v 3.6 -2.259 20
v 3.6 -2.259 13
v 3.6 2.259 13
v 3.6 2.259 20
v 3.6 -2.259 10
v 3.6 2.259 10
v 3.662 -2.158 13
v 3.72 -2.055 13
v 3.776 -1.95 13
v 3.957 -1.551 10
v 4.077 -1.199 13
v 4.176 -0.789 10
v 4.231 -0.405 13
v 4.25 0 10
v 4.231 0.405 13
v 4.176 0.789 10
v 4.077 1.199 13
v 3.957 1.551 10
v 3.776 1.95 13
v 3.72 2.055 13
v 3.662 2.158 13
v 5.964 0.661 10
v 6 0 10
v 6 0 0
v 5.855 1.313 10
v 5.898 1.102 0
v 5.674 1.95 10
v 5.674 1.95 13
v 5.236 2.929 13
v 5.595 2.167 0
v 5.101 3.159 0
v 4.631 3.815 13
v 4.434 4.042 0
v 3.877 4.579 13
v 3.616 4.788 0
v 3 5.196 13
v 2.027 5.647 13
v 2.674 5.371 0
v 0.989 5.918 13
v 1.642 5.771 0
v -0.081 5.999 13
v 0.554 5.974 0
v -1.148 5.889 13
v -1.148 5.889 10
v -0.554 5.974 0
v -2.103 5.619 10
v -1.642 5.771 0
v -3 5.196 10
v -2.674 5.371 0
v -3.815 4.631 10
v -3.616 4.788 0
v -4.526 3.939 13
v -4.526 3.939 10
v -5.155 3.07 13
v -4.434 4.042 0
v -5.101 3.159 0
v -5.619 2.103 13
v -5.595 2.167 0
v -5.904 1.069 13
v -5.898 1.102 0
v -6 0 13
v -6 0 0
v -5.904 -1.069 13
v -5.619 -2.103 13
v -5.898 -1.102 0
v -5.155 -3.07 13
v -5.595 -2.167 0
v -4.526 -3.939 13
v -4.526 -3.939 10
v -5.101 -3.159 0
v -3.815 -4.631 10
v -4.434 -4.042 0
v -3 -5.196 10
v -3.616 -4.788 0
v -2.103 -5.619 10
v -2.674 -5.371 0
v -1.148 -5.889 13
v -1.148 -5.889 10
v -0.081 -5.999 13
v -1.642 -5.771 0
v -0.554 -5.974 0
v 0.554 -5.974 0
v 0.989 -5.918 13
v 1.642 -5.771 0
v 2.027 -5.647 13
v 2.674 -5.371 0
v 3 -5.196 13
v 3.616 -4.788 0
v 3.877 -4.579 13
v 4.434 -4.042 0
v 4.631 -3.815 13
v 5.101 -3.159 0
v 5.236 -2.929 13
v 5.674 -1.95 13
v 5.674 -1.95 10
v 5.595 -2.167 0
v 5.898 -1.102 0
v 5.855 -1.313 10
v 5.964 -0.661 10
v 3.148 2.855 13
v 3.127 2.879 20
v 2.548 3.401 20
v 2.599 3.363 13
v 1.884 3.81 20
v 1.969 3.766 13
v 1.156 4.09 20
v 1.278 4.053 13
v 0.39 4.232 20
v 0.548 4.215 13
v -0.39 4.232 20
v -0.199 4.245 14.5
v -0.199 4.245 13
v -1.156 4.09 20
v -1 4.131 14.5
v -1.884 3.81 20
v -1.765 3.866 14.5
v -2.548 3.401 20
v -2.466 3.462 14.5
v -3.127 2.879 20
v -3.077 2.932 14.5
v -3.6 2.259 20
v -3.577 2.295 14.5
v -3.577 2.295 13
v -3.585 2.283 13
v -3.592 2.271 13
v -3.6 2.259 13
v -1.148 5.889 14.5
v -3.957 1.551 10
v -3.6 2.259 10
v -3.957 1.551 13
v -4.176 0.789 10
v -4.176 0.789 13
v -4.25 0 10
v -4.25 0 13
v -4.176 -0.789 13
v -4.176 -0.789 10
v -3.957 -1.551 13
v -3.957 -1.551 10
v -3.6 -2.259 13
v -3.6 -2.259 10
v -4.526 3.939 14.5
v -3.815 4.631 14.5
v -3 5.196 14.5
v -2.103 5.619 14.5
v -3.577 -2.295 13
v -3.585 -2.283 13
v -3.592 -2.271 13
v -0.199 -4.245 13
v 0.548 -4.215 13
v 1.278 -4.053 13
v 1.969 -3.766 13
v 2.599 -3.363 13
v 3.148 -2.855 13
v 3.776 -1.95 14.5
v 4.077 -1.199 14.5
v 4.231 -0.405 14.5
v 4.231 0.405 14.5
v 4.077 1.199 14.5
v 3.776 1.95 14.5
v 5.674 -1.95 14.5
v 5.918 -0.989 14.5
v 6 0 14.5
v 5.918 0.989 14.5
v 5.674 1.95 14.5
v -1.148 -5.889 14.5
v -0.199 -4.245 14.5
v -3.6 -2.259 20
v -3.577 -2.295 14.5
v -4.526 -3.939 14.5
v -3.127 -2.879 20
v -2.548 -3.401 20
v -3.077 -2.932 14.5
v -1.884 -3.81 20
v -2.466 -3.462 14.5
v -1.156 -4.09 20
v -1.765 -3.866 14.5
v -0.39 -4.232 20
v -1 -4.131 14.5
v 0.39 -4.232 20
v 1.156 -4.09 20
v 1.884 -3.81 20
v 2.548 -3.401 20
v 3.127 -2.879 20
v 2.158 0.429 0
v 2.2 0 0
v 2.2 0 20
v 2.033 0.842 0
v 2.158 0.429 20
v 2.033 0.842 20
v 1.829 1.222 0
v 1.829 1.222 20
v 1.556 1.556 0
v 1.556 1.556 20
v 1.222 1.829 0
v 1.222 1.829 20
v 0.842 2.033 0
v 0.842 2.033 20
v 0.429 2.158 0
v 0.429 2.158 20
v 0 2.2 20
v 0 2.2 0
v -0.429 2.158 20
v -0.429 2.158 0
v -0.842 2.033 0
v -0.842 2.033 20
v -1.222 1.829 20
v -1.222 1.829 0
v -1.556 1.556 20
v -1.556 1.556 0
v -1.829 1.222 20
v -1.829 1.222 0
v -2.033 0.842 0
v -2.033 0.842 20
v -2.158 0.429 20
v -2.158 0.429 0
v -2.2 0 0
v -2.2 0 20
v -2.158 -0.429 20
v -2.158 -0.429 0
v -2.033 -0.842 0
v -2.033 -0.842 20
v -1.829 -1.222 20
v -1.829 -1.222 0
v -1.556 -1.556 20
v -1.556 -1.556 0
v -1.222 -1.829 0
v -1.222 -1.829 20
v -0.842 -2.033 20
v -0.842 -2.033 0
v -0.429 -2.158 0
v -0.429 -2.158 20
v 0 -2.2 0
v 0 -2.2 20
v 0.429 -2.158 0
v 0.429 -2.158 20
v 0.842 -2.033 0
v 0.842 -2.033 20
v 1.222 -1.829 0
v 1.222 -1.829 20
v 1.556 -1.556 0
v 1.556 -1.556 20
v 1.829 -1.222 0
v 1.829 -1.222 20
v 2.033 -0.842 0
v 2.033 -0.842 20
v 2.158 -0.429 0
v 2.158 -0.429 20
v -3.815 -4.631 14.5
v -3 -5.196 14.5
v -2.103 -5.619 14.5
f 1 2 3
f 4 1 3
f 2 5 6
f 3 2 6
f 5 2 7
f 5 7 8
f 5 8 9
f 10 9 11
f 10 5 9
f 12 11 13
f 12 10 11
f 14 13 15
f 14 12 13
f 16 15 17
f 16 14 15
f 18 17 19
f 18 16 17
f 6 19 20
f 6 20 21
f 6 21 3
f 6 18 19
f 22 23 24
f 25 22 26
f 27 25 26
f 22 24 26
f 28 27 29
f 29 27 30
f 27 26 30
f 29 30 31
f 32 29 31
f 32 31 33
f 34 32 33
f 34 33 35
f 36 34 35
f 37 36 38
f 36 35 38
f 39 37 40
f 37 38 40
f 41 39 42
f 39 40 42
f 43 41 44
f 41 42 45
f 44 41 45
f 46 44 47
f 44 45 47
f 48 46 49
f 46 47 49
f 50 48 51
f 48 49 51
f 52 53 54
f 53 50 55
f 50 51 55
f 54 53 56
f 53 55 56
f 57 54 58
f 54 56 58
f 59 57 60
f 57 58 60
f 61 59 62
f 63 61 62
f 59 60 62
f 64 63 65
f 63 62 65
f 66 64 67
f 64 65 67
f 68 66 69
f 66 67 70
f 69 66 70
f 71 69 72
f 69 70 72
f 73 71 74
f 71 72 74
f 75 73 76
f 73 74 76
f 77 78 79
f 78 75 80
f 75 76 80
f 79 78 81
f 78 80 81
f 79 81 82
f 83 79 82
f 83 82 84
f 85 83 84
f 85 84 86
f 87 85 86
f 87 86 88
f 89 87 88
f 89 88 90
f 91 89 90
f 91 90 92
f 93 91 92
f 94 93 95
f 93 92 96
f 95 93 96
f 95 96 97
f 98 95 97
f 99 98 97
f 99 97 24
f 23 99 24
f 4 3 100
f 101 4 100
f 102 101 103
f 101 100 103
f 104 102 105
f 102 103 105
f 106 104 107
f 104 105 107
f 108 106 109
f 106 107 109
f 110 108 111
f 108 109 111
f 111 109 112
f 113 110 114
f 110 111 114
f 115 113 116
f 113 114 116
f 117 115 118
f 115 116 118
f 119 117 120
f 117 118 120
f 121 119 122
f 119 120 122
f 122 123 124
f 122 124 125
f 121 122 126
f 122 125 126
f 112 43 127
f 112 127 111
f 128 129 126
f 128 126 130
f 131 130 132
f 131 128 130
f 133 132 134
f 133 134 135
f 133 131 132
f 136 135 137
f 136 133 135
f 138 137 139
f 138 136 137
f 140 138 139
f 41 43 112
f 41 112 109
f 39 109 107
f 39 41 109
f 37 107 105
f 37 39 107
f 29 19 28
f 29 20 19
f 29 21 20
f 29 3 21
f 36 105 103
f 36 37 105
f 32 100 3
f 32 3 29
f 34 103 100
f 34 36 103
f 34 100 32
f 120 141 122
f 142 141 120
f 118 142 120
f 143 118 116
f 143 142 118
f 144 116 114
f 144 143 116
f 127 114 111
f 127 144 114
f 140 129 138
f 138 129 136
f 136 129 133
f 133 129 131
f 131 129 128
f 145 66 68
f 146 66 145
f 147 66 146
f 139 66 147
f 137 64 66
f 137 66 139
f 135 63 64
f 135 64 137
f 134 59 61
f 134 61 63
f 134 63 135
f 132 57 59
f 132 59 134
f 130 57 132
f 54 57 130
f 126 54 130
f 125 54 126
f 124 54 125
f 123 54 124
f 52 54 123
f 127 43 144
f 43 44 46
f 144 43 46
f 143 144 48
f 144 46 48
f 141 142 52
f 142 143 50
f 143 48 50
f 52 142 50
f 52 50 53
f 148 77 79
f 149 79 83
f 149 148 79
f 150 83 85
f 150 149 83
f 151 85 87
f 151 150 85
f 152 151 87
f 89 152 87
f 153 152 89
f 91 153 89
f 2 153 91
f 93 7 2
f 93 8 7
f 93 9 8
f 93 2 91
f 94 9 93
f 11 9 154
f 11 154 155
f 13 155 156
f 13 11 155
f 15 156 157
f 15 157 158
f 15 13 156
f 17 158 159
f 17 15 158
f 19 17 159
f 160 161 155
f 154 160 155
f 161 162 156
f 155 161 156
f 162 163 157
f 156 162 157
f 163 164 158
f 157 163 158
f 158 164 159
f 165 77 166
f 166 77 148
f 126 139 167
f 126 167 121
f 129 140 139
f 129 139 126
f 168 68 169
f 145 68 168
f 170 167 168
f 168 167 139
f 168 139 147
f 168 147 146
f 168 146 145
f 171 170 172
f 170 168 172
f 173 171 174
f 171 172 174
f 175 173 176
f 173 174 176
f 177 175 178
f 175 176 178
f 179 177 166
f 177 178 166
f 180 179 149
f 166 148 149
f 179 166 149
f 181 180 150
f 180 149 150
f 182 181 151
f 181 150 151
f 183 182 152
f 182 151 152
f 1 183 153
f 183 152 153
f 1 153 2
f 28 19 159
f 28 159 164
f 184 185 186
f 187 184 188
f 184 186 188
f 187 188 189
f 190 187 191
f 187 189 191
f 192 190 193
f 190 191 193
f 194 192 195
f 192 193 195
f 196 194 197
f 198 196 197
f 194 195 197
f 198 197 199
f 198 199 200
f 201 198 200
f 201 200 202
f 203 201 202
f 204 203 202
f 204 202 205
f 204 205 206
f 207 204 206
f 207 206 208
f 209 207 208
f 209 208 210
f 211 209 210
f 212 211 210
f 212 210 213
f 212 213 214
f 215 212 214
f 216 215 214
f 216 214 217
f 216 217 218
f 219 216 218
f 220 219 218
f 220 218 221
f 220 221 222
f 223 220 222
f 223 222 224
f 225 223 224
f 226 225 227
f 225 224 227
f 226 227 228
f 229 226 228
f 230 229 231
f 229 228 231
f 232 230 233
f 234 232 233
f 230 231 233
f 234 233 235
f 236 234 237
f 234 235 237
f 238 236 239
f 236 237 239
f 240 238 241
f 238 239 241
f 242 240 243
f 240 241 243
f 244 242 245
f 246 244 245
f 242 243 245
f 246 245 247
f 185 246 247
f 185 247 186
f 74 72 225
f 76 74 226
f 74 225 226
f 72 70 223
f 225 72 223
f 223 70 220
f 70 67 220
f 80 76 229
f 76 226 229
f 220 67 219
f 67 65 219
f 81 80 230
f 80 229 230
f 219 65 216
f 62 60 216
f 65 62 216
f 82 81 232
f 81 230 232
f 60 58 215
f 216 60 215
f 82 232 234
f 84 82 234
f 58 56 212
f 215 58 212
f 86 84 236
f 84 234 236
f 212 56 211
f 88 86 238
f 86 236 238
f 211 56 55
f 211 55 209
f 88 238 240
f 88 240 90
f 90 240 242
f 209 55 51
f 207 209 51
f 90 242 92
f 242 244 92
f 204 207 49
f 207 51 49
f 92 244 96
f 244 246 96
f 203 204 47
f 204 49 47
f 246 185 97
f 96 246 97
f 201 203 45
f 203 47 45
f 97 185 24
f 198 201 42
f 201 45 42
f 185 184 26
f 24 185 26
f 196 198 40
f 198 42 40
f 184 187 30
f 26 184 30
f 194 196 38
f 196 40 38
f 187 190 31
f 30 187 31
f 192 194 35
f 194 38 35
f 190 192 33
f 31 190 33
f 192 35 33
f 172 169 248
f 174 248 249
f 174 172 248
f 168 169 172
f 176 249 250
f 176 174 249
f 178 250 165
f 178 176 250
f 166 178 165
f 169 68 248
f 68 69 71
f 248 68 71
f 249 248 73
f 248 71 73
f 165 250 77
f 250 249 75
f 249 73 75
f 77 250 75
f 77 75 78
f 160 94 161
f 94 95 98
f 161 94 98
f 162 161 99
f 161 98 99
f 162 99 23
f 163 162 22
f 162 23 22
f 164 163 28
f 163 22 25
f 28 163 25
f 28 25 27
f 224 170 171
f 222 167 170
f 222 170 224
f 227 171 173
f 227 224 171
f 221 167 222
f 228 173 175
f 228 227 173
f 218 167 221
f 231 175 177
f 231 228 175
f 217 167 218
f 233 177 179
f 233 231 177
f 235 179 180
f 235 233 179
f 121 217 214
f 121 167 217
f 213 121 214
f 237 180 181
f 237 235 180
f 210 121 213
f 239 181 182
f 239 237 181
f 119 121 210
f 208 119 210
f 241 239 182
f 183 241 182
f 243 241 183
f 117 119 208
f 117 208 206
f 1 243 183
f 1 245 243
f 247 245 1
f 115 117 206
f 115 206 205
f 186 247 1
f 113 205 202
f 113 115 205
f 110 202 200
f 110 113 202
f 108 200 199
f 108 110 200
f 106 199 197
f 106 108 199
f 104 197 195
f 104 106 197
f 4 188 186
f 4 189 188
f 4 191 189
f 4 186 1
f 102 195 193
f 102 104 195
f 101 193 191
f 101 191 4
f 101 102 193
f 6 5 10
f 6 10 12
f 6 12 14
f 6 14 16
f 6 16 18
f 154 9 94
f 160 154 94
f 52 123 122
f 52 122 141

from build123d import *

# Parameters (mm, degrees)
SKETCH_R      = 6
PAD_DEPTH     = 10
PAD001_DEPTH  = 10
SKETCH002_R   = 2.2
POCKET_DEPTH  = 20.001
PAD002_DEPTH  = 4.5
SKETCH004_R   = 6
SKETCH004_R_2 = 4.25
PAD003_DEPTH  = 3


with BuildPart() as part:
    # Sketch → Pad (new body)
    with BuildSketch(Plane.XY):
        Circle(SKETCH_R)
    extrude(amount=PAD_DEPTH)

    # Sketch001 (on Face3 of Pad) → Pad001 (join)
    with BuildSketch(Plane.XY.offset(10)):
        with BuildLine():
            ThreePointArc((-3.6, -2.258871), (0, -4.25), (3.6, -2.258871))
            Line((3.6, -2.258871), (3.6, 2.258871))
            ThreePointArc((3.6, 2.258871), (0, 4.25), (-3.6, 2.258871))
            Line((-3.6, -2.258871), (-3.6, 2.258871))
        make_face()
    extrude(amount=PAD001_DEPTH)

    # Sketch002 (on Face8 of Pad001) → Pocket (cut, through all)
    with BuildSketch(Plane.XY.offset(20)):
        Circle(SKETCH002_R)
    extrude(amount=-POCKET_DEPTH, mode=Mode.SUBTRACT)

    # Sketch003 (on Face3 of Pocket) → Pad002 (join)
    with BuildSketch(Plane.XY.offset(10)):
        with BuildLine():
            ThreePointArc((3.776242, -1.95), (4.25, 0), (3.776242, 1.95))
            Line((3.776242, 1.95), (5.674284, 1.95))
            ThreePointArc((5.674284, -1.95), (6, 0), (5.674284, 1.95))
            Line((3.776242, -1.95), (5.674284, -1.95))
        make_face()
        with BuildLine():
            ThreePointArc((-1.148393, 5.889074), (-3, 5.196152), (-4.525892, 3.939074))
            Line((-3.57687, 2.295321), (-4.525892, 3.939074))
            ThreePointArc((-0.199371, 4.245321), (-2.125, 3.680608), (-3.57687, 2.295321))
            Line((-1.148393, 5.889074), (-0.199371, 4.245321))
        make_face()
        with BuildLine():
            ThreePointArc((-4.525892, -3.939074), (-3, -5.196152), (-1.148393, -5.889074))
            Line((-1.148393, -5.889074), (-0.199371, -4.245321))
            ThreePointArc((-3.57687, -2.295321), (-2.125, -3.680608), (-0.199371, -4.245321))
            Line((-4.525892, -3.939074), (-3.57687, -2.295321))
        make_face()
    extrude(amount=PAD002_DEPTH)

    # Sketch004 (on Face4 of Pad002) → Pad003 (join)
    with BuildSketch(Plane.XY.offset(10)):
        Circle(SKETCH004_R)
        Circle(SKETCH004_R_2, mode=Mode.SUBTRACT)
    extrude(amount=PAD003_DEPTH)


solid = part.part
